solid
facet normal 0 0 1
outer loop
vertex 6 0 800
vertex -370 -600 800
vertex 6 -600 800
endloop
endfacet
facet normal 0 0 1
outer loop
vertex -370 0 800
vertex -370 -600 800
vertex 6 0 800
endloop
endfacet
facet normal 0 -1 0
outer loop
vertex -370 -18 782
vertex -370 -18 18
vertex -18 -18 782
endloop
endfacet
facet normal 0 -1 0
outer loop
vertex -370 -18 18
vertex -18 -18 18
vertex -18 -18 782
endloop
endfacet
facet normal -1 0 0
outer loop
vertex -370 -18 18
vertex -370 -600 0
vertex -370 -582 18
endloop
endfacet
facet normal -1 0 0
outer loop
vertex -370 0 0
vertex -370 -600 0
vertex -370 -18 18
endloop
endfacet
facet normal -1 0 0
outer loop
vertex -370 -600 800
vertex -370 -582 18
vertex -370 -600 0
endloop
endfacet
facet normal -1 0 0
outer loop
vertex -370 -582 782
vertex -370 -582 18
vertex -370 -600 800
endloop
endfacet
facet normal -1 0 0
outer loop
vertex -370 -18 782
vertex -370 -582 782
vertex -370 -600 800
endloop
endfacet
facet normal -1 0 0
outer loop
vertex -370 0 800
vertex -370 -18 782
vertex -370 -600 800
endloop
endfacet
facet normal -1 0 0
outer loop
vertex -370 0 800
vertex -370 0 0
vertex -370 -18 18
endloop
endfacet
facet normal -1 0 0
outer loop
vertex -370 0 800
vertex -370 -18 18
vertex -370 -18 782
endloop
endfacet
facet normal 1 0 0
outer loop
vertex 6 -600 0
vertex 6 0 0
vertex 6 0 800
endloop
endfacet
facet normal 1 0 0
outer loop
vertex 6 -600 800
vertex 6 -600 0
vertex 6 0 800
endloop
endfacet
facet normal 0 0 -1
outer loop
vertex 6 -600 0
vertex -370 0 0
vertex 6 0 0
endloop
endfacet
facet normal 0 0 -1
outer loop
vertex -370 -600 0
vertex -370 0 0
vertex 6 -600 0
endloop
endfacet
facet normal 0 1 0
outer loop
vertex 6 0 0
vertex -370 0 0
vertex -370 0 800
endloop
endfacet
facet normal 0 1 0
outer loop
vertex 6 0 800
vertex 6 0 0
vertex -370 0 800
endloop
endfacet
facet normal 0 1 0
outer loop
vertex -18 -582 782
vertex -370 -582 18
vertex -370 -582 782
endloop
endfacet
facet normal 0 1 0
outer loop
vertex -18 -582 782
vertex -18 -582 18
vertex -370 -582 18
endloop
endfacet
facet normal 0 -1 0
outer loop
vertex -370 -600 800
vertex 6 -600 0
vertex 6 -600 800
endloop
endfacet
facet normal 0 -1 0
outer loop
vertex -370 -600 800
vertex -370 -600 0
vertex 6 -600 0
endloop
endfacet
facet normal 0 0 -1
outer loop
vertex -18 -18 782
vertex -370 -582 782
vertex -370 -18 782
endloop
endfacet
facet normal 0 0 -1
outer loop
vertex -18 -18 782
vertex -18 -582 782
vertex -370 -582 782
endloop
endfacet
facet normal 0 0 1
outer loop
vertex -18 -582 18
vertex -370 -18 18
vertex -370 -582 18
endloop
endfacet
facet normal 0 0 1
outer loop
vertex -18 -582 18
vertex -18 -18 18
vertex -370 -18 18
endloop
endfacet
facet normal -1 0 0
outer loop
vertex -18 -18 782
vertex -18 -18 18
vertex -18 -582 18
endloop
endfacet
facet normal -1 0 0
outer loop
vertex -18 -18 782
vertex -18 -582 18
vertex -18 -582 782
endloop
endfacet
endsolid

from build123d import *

# Parameters (mm, degrees)
F0_W     = 35.116635263
F0_H     = 34.8606705666
F1_DEPTH = 800
F2_DEPTH = 600
F3_DEPTH = 370
F4_T     = -18
F5_DEPTH = 6


with BuildPart() as f1:
    # F0 (on Top) → F1 (new body)
    with BuildSketch(Plane.XY):
        with Locations((-17.5583176315, -17.4303352833)):
            Rectangle(F0_W, F0_H)
    extrude(amount=F1_DEPTH)

    # F2 (add): a face of the model
    f2_faces = [f1.faces().sort_by_distance(p)[0] for p in [
        (-17.5583176315, 0, 400),
    ]]
    extrude(f2_faces, amount=-F2_DEPTH)

    # F3 (add): a face of the model
    f3_faces = [f1.faces().sort_by_distance(p)[0] for p in [
        (0, -300, 400),
    ]]
    extrude(f3_faces, amount=-F3_DEPTH)

    # F4
    f4_openings = [f1.faces().sort_by_distance(p)[0] for p in [
        (-370, -300, 400),
    ]]
    offset(amount=F4_T, openings=f4_openings)

    # F5 (add): a face of the model
    f5_faces = [f1.faces().sort_by_distance(p)[0] for p in [
        (0, -300, 400),
    ]]
    extrude(f5_faces, amount=F5_DEPTH)


solid = f1.part
